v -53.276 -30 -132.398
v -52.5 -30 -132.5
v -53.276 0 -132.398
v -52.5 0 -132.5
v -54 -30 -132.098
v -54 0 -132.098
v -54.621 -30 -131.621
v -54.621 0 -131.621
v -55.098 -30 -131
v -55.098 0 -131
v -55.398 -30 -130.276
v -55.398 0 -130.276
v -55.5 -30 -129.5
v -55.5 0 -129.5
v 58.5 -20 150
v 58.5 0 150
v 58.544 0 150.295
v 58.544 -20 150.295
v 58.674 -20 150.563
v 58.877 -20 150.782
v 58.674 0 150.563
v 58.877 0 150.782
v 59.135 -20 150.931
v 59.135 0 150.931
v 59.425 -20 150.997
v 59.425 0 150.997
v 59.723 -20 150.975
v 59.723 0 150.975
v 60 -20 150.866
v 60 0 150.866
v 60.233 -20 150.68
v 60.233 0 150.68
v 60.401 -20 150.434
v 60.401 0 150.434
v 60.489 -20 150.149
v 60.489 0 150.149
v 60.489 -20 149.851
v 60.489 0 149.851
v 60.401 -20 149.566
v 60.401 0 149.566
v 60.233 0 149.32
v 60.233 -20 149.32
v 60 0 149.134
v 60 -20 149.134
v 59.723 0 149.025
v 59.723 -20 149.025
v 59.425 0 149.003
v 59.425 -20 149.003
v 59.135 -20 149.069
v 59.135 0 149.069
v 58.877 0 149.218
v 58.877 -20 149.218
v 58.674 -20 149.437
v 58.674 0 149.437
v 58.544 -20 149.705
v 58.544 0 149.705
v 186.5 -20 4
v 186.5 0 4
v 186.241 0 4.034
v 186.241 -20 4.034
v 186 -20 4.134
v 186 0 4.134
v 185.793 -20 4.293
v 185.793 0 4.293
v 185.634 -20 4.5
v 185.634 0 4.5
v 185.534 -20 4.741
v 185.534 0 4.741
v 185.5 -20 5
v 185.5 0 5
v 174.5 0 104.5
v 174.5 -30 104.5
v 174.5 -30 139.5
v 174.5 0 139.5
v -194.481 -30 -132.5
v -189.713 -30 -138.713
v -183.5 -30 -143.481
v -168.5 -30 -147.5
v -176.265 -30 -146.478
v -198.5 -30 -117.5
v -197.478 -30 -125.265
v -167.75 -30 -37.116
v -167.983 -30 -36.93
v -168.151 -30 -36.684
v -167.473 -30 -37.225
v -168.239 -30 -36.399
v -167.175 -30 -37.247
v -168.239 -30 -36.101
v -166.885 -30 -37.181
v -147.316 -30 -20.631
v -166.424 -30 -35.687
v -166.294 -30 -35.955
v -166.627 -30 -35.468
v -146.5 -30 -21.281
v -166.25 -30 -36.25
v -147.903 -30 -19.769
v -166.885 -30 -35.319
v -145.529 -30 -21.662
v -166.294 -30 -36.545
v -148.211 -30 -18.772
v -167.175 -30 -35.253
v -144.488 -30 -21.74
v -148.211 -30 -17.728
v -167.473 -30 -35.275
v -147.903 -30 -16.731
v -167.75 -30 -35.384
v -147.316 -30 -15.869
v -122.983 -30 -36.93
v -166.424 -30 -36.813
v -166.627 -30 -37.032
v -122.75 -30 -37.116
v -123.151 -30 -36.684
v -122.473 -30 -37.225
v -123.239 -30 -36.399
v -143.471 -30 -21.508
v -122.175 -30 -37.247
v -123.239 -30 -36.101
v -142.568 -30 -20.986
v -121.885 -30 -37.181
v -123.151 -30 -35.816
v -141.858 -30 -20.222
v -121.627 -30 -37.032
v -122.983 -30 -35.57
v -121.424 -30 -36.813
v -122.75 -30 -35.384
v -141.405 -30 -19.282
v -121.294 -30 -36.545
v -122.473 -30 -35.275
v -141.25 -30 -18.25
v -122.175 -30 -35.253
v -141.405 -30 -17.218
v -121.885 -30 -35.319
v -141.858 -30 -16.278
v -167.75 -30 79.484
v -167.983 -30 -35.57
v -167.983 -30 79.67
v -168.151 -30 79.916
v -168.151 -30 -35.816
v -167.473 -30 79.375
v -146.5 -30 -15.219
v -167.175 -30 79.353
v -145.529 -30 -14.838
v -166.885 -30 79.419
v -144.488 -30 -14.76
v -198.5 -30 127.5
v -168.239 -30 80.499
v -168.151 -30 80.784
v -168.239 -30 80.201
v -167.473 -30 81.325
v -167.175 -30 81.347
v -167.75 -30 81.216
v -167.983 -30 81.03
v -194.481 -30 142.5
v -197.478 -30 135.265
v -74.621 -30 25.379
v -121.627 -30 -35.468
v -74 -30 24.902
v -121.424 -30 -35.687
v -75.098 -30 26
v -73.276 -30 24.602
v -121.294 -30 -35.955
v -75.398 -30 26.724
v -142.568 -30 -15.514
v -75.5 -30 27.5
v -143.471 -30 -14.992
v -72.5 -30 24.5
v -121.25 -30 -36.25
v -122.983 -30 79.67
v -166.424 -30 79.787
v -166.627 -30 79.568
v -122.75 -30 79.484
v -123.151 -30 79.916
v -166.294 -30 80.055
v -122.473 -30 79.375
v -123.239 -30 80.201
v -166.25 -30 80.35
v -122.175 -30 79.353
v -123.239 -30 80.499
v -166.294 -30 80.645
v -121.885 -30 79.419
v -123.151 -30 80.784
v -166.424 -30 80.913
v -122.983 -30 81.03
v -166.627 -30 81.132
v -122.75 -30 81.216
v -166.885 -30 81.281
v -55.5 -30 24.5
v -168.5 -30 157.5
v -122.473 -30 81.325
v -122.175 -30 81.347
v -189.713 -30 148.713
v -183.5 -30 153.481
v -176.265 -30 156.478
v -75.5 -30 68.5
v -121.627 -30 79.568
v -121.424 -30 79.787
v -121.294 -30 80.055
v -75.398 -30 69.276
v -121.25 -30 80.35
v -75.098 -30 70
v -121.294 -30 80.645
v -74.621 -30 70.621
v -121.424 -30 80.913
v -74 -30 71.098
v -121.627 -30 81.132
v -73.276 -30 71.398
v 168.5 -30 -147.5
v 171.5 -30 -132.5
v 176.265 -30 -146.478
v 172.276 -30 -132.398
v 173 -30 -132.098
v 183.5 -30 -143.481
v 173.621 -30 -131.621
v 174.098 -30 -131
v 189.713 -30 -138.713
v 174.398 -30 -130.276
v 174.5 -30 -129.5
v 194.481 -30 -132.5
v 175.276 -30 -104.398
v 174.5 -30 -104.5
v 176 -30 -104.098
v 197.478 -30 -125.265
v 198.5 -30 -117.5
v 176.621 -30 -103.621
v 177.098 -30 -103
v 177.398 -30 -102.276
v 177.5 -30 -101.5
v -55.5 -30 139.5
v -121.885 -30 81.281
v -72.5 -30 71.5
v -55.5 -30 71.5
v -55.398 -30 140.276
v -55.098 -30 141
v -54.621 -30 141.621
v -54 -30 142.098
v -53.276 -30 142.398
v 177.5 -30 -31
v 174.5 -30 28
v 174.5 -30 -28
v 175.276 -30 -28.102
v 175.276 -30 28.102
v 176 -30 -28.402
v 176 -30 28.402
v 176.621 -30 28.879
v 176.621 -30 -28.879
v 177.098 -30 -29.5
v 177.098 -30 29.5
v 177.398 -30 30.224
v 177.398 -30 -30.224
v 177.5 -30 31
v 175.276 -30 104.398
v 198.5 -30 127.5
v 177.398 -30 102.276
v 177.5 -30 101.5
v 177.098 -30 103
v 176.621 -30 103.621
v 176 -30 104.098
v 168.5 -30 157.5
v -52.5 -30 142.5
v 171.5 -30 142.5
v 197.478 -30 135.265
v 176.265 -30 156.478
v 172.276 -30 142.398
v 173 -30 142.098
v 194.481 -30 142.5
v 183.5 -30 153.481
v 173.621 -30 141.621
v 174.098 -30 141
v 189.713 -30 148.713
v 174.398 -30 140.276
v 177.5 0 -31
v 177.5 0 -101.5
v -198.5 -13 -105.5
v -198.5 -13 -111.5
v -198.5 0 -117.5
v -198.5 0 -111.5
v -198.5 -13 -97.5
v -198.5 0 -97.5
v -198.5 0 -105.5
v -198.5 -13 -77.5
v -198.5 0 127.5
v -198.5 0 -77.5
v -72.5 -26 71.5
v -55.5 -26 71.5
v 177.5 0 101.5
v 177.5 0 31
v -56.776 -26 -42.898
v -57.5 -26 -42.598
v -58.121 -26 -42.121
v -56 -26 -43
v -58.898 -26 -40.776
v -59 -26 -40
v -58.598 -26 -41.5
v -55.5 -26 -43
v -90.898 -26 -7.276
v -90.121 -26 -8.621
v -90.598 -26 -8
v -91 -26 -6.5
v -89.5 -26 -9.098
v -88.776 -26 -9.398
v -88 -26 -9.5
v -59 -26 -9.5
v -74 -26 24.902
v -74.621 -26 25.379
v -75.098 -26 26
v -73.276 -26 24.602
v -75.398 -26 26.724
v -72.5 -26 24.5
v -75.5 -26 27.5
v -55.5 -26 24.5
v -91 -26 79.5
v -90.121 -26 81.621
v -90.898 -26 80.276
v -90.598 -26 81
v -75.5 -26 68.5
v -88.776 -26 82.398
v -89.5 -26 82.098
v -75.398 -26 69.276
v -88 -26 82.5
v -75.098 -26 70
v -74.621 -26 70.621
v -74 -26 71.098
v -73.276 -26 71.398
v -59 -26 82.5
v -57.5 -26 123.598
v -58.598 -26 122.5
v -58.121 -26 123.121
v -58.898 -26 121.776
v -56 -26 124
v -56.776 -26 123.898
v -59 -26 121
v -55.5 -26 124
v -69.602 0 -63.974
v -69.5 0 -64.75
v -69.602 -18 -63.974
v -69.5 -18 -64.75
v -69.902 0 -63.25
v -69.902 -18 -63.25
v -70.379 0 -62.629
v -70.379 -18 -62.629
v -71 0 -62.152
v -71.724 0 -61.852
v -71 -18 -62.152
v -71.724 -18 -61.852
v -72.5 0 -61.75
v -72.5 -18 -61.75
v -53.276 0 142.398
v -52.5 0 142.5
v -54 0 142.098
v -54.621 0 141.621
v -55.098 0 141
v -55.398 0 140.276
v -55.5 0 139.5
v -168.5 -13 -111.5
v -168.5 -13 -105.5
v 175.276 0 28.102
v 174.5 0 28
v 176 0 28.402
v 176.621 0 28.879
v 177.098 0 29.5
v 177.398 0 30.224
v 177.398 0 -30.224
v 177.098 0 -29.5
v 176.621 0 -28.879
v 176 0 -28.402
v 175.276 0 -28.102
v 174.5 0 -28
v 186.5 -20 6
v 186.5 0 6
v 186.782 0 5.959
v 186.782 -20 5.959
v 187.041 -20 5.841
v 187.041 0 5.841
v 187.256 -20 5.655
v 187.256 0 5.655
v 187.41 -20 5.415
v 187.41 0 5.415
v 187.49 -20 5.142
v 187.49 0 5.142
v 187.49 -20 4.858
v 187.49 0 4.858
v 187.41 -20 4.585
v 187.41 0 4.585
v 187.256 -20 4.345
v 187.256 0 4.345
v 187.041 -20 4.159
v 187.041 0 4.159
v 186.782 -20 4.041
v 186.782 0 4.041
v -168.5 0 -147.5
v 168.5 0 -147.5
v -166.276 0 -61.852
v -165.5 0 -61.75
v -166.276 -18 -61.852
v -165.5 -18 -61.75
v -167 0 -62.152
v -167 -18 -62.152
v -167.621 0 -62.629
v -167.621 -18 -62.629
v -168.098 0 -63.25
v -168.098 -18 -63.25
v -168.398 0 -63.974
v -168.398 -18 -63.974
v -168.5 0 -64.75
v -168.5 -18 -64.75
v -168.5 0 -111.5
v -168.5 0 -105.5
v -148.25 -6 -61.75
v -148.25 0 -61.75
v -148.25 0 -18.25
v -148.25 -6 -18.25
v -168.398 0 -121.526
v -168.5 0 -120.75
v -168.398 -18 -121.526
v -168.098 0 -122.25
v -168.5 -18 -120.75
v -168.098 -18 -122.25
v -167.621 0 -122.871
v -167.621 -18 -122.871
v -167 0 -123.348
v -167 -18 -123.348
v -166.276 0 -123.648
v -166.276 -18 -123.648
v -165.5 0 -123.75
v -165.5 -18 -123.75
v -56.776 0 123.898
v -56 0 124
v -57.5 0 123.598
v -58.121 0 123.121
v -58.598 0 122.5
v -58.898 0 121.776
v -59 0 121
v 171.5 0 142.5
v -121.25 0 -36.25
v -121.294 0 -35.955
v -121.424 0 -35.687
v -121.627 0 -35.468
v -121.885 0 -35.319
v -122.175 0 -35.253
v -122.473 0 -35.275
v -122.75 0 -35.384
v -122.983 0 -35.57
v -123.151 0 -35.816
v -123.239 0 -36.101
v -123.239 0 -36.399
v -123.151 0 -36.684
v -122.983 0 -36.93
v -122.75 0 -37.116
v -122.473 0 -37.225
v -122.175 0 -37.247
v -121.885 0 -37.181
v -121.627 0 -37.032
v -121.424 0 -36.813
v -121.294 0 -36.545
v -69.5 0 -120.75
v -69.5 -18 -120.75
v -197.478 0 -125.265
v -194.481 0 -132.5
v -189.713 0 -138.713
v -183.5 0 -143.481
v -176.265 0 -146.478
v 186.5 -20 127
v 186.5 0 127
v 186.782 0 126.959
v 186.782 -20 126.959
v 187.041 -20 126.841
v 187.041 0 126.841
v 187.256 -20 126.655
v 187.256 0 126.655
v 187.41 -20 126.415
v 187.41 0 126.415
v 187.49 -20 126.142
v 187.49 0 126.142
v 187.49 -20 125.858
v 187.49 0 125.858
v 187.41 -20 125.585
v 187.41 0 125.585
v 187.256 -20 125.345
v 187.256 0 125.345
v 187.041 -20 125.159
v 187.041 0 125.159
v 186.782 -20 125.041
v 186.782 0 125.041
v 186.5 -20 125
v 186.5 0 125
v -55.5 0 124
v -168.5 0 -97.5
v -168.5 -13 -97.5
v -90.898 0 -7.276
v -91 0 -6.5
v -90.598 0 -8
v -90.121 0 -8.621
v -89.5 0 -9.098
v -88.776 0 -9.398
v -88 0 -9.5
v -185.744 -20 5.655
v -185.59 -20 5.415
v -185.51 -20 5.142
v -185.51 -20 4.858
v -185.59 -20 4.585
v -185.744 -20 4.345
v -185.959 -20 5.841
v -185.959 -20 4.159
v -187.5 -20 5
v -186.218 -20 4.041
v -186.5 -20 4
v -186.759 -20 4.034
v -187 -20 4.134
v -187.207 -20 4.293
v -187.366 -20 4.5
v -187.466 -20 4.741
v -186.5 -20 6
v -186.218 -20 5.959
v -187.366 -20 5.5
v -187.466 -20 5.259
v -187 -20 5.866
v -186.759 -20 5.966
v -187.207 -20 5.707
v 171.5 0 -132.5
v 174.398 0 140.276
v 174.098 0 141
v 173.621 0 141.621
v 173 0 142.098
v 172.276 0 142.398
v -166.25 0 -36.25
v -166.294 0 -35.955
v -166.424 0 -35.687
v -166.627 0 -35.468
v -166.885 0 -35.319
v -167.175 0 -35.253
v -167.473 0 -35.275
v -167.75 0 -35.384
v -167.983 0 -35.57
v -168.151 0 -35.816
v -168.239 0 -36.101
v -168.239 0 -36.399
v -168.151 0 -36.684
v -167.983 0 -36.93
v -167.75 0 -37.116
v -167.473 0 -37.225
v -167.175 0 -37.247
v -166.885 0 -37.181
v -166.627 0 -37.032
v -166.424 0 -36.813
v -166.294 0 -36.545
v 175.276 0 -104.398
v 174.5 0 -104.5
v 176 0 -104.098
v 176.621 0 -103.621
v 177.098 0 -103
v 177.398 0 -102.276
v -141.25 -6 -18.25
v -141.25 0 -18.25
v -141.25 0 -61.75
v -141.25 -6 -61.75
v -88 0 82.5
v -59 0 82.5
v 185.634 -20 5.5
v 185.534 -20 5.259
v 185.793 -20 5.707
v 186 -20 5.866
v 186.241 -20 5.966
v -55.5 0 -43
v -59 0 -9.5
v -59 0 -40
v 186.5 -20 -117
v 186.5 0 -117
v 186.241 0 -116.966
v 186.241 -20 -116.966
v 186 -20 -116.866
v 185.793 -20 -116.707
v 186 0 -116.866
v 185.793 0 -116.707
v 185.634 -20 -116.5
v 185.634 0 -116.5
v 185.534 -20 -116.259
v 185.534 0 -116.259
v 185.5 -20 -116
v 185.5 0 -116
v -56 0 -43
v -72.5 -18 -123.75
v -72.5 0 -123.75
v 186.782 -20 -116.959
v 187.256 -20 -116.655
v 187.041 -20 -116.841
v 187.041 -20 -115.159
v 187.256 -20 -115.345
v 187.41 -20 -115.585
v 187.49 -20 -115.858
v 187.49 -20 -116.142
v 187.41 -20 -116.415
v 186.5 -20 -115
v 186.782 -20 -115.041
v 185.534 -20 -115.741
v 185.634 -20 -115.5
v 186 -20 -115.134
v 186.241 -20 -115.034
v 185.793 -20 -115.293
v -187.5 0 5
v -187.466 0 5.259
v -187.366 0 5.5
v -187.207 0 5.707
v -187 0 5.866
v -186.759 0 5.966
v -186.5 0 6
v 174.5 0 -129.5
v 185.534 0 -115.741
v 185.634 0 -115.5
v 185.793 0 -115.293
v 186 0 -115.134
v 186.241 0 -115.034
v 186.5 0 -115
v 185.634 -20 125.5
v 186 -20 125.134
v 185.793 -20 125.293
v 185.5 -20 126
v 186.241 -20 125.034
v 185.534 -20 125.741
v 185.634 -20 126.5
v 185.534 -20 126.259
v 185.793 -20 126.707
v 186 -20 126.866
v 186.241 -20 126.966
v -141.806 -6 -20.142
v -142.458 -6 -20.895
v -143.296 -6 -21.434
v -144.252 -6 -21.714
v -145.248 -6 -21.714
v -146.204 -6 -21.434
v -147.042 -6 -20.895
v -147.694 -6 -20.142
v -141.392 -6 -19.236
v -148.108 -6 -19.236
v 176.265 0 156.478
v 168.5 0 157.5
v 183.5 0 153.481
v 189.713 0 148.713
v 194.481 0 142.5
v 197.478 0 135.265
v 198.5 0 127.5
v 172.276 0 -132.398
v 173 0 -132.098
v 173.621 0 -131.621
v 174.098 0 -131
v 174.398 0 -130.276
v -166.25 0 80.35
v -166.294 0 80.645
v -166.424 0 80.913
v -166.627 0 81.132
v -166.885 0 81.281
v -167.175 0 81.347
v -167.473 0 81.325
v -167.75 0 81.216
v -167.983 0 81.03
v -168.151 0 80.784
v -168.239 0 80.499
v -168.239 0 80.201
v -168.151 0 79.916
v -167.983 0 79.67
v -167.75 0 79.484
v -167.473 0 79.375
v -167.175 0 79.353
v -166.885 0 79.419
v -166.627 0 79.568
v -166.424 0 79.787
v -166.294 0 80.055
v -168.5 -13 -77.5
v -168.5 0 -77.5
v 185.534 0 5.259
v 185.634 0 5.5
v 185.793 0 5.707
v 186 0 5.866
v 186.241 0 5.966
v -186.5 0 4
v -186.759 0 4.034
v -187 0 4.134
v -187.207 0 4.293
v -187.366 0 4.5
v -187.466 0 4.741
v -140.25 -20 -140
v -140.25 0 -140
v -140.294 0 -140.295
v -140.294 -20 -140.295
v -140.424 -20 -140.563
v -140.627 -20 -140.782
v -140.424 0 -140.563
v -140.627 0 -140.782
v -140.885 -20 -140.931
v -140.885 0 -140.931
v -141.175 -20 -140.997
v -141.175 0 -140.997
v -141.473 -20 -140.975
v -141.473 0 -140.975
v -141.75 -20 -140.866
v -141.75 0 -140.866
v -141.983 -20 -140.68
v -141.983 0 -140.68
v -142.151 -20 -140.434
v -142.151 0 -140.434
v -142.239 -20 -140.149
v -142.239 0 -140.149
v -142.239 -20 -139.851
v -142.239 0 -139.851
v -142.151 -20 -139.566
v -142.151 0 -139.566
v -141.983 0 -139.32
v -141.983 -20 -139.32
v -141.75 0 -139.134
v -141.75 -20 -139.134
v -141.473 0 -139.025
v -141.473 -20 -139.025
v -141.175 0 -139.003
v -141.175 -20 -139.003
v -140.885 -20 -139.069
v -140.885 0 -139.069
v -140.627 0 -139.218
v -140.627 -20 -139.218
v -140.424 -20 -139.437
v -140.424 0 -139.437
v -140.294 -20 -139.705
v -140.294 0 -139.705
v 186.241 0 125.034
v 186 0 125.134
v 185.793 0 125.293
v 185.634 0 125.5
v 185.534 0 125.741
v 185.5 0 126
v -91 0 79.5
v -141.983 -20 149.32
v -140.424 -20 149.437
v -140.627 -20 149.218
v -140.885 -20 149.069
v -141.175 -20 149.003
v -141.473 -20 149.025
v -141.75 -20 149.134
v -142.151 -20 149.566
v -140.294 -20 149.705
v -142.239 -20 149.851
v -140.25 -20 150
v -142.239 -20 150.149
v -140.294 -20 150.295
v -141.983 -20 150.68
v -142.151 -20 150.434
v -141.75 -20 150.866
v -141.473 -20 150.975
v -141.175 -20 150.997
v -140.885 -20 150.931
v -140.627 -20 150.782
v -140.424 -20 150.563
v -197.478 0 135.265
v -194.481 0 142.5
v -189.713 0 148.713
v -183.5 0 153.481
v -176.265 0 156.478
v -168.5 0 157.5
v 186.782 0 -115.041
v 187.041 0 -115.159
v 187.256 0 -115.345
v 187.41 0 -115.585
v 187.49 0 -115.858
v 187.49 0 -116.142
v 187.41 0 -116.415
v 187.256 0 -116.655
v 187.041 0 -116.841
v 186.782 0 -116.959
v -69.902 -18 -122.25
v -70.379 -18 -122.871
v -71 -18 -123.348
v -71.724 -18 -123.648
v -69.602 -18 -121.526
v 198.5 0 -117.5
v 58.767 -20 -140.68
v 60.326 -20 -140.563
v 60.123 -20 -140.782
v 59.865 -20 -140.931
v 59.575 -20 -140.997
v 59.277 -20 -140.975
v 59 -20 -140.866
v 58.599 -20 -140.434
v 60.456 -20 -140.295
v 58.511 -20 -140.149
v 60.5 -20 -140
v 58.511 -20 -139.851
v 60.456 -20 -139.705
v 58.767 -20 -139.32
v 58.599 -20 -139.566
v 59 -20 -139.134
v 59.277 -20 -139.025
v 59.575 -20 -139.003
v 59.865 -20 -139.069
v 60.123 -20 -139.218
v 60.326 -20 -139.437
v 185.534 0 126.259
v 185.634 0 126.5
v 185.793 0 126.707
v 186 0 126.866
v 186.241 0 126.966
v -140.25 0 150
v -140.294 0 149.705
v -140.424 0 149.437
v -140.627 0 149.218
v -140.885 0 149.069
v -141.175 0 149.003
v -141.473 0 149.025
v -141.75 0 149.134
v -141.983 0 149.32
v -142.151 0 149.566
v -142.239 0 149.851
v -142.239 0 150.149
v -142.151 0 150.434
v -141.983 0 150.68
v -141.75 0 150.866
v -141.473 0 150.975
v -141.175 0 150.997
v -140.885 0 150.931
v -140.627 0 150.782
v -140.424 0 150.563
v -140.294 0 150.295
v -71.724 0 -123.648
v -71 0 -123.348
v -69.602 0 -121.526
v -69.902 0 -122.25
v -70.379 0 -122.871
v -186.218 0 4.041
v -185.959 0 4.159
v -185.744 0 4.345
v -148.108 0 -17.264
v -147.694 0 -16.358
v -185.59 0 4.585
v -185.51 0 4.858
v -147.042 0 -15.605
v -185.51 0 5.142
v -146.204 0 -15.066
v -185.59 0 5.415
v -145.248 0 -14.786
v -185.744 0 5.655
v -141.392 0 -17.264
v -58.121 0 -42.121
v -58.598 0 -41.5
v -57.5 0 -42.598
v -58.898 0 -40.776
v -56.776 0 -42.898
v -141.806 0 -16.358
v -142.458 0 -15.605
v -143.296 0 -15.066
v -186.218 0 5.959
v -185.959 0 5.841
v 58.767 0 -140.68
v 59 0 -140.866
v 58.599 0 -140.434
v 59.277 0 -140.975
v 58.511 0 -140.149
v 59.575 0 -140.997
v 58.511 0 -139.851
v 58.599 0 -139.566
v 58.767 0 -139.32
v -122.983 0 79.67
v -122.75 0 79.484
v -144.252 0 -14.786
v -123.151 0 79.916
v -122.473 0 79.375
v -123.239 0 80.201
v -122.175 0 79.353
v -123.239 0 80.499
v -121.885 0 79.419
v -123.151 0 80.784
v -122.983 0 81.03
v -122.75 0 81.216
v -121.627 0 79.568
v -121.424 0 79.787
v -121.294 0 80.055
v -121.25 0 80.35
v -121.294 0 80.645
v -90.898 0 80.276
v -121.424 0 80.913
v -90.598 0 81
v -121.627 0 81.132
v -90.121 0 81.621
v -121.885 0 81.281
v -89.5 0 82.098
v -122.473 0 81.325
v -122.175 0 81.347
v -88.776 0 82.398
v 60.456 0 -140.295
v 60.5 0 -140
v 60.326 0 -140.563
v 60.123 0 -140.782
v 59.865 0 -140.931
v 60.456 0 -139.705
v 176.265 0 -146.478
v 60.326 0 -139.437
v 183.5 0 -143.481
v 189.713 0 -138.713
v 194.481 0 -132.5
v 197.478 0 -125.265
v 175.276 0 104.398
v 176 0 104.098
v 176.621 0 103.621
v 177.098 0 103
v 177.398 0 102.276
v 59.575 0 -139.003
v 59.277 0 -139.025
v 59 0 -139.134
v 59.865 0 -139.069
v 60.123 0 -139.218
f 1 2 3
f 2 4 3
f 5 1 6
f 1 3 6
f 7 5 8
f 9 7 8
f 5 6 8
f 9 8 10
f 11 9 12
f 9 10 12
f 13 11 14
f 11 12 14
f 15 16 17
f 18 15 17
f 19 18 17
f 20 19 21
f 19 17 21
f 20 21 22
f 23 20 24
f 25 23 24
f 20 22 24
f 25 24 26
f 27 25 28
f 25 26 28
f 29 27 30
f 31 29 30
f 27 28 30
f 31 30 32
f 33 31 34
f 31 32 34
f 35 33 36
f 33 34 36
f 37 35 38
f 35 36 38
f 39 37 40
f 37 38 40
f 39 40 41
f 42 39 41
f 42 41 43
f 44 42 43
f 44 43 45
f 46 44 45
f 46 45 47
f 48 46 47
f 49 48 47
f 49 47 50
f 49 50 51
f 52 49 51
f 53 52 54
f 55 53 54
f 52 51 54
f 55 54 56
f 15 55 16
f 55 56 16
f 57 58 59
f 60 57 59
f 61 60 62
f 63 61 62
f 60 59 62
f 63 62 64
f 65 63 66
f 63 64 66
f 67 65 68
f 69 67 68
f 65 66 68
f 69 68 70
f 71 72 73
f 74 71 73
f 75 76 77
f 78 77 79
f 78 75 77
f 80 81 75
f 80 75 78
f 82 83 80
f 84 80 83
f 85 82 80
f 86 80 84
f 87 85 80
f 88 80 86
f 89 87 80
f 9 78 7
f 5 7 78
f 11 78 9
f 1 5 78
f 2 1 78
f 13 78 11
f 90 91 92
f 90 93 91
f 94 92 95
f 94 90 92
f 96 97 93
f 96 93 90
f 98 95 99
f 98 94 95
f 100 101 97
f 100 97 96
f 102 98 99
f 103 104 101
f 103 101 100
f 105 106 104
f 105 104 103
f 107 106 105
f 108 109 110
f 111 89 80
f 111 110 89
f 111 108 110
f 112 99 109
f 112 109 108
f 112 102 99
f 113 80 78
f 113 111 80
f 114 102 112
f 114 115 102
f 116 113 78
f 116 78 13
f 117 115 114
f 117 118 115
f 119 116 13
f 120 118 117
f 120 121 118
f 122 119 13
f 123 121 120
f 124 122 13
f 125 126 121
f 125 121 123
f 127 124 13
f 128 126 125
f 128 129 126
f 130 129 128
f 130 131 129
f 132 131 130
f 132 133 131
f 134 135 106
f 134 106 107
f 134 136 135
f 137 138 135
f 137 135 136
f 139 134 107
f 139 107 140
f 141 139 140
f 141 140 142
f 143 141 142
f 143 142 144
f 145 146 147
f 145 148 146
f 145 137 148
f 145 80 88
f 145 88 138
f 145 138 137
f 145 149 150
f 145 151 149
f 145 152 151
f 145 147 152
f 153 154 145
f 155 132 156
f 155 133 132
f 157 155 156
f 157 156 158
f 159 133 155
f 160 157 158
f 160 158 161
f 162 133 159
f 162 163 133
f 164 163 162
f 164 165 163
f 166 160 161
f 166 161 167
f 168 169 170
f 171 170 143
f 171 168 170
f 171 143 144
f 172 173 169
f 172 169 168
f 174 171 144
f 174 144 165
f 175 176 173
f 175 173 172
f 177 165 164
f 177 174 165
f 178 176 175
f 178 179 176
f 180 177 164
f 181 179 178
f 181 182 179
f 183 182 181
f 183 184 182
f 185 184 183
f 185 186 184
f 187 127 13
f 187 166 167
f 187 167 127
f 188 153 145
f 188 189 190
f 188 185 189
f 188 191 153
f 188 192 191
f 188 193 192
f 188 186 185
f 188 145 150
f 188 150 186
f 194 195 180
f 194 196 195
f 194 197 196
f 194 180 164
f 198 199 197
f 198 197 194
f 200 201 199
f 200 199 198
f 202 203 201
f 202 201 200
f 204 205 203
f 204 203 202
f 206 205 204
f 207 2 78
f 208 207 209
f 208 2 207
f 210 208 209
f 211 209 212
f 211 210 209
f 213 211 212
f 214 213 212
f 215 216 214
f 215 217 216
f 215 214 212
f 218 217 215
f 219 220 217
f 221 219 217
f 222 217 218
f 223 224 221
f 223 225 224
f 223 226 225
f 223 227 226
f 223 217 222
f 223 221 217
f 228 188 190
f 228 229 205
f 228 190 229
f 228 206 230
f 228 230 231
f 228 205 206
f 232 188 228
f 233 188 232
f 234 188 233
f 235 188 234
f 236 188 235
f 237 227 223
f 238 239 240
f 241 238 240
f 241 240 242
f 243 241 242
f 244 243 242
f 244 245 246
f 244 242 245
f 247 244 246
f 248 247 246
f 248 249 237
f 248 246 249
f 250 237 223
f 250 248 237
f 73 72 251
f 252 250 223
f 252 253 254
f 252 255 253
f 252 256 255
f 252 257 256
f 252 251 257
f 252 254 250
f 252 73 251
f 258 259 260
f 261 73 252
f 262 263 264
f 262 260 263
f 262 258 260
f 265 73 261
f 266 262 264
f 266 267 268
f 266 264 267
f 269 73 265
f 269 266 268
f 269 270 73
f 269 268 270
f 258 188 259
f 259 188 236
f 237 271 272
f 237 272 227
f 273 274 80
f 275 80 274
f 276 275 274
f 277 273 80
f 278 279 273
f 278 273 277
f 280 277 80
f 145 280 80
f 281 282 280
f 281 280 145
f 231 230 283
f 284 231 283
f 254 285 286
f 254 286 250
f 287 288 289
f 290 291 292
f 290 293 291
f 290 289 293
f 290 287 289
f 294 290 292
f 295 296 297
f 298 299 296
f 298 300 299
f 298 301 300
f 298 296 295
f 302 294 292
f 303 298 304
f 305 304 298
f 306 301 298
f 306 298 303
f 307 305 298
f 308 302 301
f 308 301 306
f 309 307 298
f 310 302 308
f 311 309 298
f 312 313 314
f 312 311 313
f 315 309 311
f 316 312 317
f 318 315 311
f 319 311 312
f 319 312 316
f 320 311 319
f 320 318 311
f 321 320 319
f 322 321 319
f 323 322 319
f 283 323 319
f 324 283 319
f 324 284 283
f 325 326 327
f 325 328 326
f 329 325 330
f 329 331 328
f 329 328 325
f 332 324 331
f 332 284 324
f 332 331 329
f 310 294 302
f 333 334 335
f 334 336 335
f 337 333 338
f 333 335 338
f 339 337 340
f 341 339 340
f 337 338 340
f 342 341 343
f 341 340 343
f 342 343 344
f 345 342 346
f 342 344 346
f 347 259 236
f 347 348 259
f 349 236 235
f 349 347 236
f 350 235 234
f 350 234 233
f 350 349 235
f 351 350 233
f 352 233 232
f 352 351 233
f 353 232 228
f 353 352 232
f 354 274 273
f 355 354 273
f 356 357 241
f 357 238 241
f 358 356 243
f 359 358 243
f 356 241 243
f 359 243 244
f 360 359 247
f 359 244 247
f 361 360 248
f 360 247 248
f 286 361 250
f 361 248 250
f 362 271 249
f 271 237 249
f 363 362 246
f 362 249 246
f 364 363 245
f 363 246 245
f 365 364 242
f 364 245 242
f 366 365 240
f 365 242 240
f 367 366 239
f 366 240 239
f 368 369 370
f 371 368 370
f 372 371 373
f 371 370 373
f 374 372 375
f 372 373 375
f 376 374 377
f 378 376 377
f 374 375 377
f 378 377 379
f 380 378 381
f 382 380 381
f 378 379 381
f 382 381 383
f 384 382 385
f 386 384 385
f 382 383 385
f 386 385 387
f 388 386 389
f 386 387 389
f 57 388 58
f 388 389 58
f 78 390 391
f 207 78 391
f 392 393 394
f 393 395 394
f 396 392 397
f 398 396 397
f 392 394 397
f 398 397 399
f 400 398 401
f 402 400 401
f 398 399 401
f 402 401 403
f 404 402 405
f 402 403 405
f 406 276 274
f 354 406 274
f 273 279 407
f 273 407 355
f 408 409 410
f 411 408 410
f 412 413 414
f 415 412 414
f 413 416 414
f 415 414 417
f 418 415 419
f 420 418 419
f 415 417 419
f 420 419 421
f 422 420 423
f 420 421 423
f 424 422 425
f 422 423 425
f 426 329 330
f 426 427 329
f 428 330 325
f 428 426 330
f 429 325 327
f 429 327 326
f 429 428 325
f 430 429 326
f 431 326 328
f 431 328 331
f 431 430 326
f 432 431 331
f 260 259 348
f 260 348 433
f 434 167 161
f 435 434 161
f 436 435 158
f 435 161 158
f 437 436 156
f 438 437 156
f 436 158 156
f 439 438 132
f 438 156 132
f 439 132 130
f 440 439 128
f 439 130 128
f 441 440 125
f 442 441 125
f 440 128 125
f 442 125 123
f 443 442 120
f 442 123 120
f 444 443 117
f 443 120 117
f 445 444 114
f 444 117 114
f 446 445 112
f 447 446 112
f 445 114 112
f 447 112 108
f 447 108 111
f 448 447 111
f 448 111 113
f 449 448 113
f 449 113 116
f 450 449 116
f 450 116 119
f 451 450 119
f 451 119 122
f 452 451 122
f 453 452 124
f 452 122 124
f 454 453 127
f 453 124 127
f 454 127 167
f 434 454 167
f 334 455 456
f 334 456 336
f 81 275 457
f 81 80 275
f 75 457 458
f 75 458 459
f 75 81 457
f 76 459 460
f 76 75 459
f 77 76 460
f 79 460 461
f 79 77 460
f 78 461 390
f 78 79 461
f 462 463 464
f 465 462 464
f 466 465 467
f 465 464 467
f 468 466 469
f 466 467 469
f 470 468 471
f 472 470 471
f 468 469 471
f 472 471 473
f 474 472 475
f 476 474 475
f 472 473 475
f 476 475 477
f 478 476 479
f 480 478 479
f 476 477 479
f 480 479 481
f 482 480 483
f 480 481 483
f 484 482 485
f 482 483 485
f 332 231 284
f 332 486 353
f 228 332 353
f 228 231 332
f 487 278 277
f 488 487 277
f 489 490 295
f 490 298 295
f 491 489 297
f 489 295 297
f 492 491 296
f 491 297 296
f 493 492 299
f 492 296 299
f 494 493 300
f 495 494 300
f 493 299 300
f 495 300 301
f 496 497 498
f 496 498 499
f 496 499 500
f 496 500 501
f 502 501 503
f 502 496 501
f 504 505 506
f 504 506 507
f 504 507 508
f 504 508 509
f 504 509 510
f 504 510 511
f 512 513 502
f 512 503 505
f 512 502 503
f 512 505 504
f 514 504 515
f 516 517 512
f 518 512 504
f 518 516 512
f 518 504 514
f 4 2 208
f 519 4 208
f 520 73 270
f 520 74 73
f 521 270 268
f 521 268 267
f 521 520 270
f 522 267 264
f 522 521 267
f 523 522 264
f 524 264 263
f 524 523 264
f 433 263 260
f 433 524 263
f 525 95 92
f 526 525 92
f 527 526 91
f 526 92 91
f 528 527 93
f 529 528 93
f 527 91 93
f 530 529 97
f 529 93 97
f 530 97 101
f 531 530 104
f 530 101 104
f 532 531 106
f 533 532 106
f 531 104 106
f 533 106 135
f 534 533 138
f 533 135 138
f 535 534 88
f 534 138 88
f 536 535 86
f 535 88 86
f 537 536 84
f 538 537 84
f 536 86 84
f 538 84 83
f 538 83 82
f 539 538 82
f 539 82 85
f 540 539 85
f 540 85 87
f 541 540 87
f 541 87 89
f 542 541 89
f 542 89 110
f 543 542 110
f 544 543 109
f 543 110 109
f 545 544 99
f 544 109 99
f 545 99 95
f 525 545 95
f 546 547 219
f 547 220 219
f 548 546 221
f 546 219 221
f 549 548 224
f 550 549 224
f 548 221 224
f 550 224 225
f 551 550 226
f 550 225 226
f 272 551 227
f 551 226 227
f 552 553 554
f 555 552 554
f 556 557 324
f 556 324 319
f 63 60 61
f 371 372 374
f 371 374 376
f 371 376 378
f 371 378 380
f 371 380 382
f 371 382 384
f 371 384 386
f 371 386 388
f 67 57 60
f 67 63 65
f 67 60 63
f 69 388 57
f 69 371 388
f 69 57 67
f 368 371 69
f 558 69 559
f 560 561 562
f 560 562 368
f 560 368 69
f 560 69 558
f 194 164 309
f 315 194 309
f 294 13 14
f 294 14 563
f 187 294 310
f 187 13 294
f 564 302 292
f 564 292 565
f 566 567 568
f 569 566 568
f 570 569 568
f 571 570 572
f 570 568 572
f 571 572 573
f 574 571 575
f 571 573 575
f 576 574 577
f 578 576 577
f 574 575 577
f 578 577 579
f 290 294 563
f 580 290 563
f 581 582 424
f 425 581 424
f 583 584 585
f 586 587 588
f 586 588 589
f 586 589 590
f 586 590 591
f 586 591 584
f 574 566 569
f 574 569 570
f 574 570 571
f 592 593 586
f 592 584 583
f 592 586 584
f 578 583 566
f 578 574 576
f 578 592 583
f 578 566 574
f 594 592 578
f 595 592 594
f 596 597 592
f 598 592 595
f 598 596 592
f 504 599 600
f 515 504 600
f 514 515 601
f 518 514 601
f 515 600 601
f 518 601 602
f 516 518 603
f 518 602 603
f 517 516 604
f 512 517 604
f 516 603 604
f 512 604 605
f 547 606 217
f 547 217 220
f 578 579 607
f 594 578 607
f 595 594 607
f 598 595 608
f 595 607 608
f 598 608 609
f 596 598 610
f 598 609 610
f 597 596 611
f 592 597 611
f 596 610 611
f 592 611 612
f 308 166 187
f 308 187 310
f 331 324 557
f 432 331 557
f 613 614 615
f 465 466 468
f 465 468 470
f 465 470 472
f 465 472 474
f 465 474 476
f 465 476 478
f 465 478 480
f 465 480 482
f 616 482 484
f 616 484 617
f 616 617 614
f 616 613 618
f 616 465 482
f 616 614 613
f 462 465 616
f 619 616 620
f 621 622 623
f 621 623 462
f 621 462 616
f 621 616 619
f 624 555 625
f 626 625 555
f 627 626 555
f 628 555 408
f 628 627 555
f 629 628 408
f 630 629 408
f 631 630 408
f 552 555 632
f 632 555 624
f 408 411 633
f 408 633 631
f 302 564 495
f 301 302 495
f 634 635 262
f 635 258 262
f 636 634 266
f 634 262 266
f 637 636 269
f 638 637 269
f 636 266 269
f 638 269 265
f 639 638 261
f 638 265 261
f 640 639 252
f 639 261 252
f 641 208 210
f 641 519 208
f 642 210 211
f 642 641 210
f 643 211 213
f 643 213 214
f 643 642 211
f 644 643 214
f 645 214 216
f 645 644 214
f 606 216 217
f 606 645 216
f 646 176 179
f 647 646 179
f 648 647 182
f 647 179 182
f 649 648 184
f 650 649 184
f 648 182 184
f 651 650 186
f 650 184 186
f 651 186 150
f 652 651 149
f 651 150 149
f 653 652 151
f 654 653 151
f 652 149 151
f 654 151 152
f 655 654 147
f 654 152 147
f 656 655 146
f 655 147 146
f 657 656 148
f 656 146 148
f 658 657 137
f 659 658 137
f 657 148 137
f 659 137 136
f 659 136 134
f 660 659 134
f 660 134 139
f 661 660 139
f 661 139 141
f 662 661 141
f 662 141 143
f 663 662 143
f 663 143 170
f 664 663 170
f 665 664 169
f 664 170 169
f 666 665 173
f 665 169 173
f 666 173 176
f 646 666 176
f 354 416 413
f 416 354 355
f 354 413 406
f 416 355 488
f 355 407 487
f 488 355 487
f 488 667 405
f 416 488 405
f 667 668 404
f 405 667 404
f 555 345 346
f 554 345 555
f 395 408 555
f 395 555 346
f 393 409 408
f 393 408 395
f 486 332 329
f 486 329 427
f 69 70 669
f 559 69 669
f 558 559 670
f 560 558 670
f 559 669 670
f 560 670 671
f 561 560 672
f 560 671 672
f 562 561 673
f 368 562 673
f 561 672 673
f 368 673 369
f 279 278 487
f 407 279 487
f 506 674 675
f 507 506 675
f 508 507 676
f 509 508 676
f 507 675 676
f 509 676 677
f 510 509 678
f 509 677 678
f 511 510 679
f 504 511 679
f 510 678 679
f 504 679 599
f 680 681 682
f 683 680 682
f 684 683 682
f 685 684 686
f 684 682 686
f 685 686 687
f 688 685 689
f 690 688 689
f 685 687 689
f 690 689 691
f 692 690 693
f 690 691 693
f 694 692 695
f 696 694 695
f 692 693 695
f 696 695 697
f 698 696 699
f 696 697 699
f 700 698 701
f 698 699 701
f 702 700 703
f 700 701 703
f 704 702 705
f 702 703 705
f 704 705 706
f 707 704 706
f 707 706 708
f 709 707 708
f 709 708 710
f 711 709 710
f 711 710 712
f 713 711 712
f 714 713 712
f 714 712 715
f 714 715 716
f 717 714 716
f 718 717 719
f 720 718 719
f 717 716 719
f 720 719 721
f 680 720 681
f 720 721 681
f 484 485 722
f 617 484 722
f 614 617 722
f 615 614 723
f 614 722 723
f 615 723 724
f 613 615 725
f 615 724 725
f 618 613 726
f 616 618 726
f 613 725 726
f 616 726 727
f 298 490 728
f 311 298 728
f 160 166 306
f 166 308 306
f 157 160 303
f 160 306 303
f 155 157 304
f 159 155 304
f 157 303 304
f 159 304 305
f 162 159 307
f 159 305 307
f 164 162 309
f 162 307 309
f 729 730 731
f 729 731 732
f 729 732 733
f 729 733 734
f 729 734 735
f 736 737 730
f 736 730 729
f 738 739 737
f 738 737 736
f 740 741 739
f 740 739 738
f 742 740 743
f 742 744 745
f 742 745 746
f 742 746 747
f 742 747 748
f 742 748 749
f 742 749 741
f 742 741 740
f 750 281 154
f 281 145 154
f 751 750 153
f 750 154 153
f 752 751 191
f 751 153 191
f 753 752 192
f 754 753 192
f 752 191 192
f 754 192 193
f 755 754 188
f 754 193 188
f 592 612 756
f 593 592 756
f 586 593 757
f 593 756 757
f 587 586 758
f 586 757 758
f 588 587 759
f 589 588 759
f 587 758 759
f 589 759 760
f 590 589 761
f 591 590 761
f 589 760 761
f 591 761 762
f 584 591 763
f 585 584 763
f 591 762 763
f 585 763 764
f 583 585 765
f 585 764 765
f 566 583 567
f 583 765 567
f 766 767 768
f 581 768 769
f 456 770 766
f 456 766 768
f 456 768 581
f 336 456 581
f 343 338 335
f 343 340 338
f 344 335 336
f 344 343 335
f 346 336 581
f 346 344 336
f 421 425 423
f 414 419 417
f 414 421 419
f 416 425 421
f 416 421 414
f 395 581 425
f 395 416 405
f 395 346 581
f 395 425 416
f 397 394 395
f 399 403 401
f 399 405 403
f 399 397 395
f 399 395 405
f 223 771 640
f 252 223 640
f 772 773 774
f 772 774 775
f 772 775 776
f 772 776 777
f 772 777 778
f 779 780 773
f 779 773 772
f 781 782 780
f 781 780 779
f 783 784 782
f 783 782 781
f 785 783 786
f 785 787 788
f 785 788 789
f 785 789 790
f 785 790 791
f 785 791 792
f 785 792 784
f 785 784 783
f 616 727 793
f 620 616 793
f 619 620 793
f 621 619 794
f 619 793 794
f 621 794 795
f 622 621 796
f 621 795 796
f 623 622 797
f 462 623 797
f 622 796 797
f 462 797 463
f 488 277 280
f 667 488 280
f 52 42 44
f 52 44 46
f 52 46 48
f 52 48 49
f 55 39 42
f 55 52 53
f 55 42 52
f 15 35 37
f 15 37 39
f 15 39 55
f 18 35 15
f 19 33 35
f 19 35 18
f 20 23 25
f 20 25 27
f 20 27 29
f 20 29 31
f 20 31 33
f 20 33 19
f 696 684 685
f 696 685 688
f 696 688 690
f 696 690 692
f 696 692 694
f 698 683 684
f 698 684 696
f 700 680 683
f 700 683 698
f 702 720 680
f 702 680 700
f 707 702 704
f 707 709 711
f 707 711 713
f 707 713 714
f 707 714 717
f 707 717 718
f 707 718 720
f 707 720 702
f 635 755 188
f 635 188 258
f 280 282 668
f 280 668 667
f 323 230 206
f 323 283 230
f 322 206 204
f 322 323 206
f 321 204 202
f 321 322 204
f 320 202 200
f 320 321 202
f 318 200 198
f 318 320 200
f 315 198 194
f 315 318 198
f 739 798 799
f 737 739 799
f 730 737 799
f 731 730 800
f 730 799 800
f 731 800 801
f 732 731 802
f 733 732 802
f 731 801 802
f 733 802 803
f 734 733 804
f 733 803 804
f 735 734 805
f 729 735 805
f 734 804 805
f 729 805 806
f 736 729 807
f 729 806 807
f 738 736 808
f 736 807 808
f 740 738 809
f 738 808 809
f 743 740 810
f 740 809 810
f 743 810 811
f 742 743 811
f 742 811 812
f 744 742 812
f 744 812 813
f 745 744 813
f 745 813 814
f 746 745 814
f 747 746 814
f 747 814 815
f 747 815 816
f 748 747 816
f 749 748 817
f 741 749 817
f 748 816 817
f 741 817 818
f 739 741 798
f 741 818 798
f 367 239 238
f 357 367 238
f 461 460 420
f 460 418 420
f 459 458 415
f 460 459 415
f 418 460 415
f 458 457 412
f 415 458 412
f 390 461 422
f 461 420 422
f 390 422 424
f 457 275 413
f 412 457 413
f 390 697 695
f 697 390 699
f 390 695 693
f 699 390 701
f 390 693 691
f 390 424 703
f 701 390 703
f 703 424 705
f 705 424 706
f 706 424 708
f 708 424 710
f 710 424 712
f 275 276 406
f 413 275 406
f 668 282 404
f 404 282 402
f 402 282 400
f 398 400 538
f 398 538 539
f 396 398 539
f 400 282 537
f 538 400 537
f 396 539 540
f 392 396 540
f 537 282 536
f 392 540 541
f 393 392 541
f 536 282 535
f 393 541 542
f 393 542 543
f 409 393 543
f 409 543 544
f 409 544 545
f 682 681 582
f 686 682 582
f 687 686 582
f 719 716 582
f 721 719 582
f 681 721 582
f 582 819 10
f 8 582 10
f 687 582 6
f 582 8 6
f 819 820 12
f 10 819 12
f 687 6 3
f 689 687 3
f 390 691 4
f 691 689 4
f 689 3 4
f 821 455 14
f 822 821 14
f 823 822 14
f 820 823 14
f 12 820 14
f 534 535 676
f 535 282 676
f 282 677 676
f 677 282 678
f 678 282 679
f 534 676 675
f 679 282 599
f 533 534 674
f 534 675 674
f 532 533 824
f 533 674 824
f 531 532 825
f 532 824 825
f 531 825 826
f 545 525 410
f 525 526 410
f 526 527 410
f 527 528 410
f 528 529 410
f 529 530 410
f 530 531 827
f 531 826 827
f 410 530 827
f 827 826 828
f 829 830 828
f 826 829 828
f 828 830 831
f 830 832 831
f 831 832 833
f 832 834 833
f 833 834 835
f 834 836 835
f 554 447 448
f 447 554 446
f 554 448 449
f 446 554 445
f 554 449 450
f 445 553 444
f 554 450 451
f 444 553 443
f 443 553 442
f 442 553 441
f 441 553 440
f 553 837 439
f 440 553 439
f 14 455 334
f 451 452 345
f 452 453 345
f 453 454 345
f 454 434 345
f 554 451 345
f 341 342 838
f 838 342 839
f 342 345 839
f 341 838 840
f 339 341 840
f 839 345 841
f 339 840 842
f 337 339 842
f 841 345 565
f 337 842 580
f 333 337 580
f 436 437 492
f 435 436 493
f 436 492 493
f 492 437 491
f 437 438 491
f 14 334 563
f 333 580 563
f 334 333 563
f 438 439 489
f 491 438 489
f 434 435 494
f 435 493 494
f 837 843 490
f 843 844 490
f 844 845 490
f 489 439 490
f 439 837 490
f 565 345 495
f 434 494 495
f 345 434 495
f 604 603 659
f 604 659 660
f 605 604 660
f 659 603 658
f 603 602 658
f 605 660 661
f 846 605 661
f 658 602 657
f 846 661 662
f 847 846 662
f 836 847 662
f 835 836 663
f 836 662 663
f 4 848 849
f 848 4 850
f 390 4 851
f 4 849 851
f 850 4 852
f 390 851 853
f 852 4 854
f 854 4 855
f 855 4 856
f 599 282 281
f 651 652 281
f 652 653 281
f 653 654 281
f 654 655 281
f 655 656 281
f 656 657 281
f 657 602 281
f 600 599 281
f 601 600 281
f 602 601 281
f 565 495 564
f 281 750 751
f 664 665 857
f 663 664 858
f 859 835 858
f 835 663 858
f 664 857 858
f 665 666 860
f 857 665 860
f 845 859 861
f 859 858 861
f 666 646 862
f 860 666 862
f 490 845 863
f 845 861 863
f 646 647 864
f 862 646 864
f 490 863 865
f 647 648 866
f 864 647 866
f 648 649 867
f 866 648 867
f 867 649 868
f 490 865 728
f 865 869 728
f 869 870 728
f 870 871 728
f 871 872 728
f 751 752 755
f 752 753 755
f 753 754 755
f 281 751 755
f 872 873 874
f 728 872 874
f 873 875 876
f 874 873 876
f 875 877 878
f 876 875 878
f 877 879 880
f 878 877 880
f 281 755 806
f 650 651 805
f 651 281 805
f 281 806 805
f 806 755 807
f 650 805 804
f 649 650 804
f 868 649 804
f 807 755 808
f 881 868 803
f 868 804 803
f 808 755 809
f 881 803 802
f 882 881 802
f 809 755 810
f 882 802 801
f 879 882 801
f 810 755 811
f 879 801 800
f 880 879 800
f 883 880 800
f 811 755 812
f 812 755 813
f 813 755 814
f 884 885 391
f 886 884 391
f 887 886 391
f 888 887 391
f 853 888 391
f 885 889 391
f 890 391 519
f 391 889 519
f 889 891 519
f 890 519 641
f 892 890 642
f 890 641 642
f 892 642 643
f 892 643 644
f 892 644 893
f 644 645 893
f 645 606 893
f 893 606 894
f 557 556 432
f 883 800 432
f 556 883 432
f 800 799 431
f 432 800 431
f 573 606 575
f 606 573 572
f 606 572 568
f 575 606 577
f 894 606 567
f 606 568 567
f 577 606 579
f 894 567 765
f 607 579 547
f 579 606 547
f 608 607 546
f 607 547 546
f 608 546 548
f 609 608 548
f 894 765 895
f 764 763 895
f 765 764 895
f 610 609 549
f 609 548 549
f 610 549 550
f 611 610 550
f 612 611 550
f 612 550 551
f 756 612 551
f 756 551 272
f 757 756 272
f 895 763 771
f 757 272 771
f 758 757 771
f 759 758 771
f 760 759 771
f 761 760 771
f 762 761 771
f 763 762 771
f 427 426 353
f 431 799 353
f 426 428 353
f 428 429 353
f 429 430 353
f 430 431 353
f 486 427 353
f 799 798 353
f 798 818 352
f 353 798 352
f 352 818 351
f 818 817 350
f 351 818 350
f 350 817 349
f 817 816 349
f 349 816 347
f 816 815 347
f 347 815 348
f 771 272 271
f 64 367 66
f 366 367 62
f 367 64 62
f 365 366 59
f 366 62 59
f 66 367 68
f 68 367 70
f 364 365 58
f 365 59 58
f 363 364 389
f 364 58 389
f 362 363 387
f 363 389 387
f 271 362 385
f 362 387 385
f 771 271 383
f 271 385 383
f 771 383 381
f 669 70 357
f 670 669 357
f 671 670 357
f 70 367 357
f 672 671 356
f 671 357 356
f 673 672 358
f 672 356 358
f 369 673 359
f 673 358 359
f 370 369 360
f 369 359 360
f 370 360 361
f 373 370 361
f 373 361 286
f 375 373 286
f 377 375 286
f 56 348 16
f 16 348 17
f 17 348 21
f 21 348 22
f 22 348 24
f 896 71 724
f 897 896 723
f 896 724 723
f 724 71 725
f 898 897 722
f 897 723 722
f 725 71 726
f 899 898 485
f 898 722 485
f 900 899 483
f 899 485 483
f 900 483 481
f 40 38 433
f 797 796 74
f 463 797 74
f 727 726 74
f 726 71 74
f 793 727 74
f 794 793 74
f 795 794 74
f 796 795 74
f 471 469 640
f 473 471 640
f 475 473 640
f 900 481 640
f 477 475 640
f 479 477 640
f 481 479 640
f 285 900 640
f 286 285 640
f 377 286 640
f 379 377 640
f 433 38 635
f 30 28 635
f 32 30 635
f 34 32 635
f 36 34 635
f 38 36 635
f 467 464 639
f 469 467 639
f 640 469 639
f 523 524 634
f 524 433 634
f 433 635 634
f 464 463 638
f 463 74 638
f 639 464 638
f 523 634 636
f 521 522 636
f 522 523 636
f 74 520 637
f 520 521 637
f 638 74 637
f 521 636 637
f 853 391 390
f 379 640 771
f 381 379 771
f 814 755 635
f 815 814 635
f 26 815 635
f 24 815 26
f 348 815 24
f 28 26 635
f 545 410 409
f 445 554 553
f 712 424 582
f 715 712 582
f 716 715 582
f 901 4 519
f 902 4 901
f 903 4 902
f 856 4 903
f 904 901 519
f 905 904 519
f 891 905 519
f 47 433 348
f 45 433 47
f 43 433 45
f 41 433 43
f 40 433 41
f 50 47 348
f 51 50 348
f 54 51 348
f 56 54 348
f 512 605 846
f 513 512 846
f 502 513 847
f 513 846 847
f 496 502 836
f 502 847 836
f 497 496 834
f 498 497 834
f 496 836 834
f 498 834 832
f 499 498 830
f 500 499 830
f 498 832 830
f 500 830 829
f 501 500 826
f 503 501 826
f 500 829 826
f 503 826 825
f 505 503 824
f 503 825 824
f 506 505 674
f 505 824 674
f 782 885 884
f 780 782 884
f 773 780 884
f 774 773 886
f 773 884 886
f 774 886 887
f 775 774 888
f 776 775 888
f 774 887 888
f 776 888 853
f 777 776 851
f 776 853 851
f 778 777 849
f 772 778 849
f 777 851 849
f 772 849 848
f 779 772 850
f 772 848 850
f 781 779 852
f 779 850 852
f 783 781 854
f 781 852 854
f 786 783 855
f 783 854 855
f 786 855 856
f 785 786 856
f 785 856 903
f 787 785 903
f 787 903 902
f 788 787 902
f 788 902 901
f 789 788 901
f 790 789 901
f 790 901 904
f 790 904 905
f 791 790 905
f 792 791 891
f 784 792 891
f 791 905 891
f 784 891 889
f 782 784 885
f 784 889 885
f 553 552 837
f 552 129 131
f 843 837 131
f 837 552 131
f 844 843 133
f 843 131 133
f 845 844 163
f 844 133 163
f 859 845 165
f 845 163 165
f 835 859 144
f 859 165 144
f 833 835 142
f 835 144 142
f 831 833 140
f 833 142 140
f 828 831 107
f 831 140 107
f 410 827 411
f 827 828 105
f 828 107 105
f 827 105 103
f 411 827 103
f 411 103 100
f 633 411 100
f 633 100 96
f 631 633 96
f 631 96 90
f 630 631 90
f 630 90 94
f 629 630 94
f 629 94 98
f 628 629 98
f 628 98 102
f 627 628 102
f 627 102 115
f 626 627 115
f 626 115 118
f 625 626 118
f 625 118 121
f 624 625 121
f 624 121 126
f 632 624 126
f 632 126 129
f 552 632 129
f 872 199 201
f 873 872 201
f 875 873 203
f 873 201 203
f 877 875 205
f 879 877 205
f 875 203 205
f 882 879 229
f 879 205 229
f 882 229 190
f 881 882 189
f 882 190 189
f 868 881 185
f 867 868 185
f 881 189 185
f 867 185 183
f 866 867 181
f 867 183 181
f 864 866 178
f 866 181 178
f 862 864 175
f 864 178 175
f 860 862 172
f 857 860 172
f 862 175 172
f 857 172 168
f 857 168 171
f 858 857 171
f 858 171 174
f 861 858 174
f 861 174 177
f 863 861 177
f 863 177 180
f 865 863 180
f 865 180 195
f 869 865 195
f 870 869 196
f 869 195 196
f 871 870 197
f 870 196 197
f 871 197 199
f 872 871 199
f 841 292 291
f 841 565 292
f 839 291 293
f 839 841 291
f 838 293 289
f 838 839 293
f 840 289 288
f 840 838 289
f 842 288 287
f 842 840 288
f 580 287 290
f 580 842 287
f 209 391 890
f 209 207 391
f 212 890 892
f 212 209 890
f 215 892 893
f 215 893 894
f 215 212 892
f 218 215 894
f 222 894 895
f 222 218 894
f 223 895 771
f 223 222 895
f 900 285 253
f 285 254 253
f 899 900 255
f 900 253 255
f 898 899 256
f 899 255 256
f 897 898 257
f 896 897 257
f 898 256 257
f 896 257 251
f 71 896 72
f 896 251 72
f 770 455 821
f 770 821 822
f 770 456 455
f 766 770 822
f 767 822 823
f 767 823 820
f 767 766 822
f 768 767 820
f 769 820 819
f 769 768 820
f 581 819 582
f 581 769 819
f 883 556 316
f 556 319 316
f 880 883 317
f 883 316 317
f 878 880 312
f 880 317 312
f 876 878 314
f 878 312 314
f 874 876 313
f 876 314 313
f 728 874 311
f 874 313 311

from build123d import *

# Parameters (mm, degrees)
F0_W      = 397
F0_H      = 305
F1_DEPTH  = 30
F2_W      = 230
F2_H      = 275
F3_DEPTH  = 30
F4_R      = 3
F5_R      = 30
F6_W      = 26
F6_H      = 167
F7_DEPTH  = 3.5
F8_R      = 3
F10_W     = 32
F10_H     = 92
F11_DEPTH = 26
F12_R     = 3
F13_W     = 4
F13_H     = 47
F14_DEPTH = 20
F15_R     = 3
F16_W     = 30
F16_H     = 76.5
F17_DEPTH = 3
F18_R     = 2.99999
F19_R     = 3.5
F20_DEPTH = 30
F21_W     = 99
F21_H     = 62
F22_DEPTH = 18
F23_R     = 3
F25_DEPTH = 6
F26_W     = 13
F26_H     = 20
F26_H_2   = 6
F27_DEPTH = 30
F28_R     = 1
F29_DEPTH = 30
F31_DEPTH = 20


# Not quite as in the source:
# - a fillet or chamfer is up to 0.001 mm smaller than in the source, because OpenCascade refuses the exact size
# - a feature names something its author has since deleted; it is built from what else it names


with BuildPart() as f1:
    # F0 (on Front) → F1 (new body)
    with BuildSketch(Plane.XZ):
        with Locations((0, 5)):
            Rectangle(F0_W, F0_H)
    extrude(amount=F1_DEPTH)

    # F2 (on face) → F3 (cut, through all)
    with BuildSketch(Plane.XZ.offset(30)):
        with Locations((59.5, 5)):
            Rectangle(F2_W, F2_H)
    extrude(amount=-F3_DEPTH, mode=Mode.SUBTRACT)

    # F4
    f4_edges = [f1.edges().sort_by_distance(p)[0] for p in [
        (-55.5, -15, 142.5),
        (174.5, -15, 142.5),
        (174.5, -15, -132.5),
        (-55.5, -15, -132.5),
    ]]
    fillet(f4_edges, radius=F4_R)

    # F5
    f5_edges = [f1.edges().sort_by_distance(p)[0] for p in [
        (-198.5, -15, -147.5),
        (-198.5, -15, 157.5),
        (198.5, -15, 157.5),
        (198.5, -15, -147.5),
    ]]
    fillet(f5_edges, radius=F5_R)

    # F6 (on face) → F7 (cut)
    with BuildSketch(Plane.YZ.offset(-55.5)):
        with Locations((-13, 40.5)):
            Rectangle(F6_W, F6_H)
    extrude(amount=-F7_DEPTH, mode=Mode.SUBTRACT)

    # F8
    f8_edges = [f1.edges().sort_by_distance(p)[0] for p in [
        (-59, -13, -43),
        (-59, -13, 124),
    ]]
    fillet(f8_edges, radius=F8_R)

    # F10 (on face) → F11 (cut)
    with BuildSketch(Plane(origin=(0, 0, 0), x_dir=(-1, 0, 0), z_dir=(0, 1, 0))):
        with Locations((75, 36.5)):
            Rectangle(F10_W, F10_H)
    extrude(amount=-F11_DEPTH, mode=Mode.SUBTRACT)

    # F12
    f12_edges = [f1.edges().sort_by_distance(p)[0] for p in [
        (-91, -13, -9.5),
        (-91, -13, 82.5),
    ]]
    fillet(f12_edges, radius=F12_R)

    # F13 (on face) → F14 (cut)
    with BuildSketch(Plane.YZ.offset(-55.5)):
        with Locations((-28, 48)):
            Rectangle(F13_W, F13_H)
    extrude(amount=-F14_DEPTH, mode=Mode.SUBTRACT)

    # F15
    f15_edges = [f1.edges().sort_by_distance(p)[0] for p in [
        (-75.5, -28, 24.5),
        (-75.5, -28, 71.5),
    ]]
    fillet(f15_edges, radius=F15_R)

    # F16 (on face) → F17 (cut)
    with BuildSketch(Plane(origin=(174.5, 0, 0), x_dir=(0, -1, 0), z_dir=(-1, 0, 0))):
        with Locations((15, -66.25)):
            Rectangle(F16_W, F16_H)
        with Locations((15, 66.25)):
            Rectangle(F16_W, F16_H)
    extrude(amount=-F17_DEPTH, mode=Mode.SUBTRACT)

    # F18 (radius 3 in the source; OpenCascade refuses exactly that, so slightly less here)
    f18_edges = [f1.edges().sort_by_distance(p)[0] for p in [
        (177.5, -15, -104.5),
        (177.5, -15, 28),
        (177.5, -15, 104.5),
        (177.5, -15, -28),
    ]]
    fillet(f18_edges, radius=F18_R)

    # F19 (on face) → F20 (cut)
    with BuildSketch(Plane.XZ.offset(30)):
        with Locations((-144.75, -18.25)):
            Circle(F19_R)
    extrude(amount=-F20_DEPTH, mode=Mode.SUBTRACT)

    # F21 (on face) → F22 (cut)
    with BuildSketch(Plane(origin=(0, 0, 0), x_dir=(-1, 0, 0), z_dir=(0, 1, 0))):
        with Locations((119, -92.75)):
            Rectangle(F21_W, F21_H)
    extrude(amount=-F22_DEPTH, mode=Mode.SUBTRACT)

    # F23
    f23_edges = [f1.edges().sort_by_distance(p)[0] for p in [
        (-168.5, -9, -123.75),
        (-69.5, -9, -123.75),
        (-69.5, -9, -61.75),
        (-168.5, -9, -61.75),
    ]]
    fillet(f23_edges, radius=F23_R)

    # F24 (on face) → F25 (cut)
    with BuildSketch(Plane(origin=(0, 0, 0), x_dir=(-1, 0, 0), z_dir=(0, 1, 0))):
        with BuildLine():
            ThreePointArc((148.25, -18.25), (144.75, -21.75), (141.25, -18.25))
            Line((141.25, -18.25), (141.25, -61.75))
            Line((141.25, -61.75), (148.25, -61.75))
            Line((148.25, -61.75), (148.25, -18.25))
        make_face()
    extrude(amount=-F25_DEPTH, mode=Mode.SUBTRACT)

    # F26 (on face) → F27 (cut)
    with BuildSketch(Plane(origin=(-198.5, 0, 0), x_dir=(0, -1, 0), z_dir=(-1, 0, 0))):
        with Locations((6.5, -87.5)):
            Rectangle(F26_W, F26_H)
        with Locations((6.5, -108.5)):
            Rectangle(F26_W, F26_H_2)
    extrude(amount=-F27_DEPTH, mode=Mode.SUBTRACT)

    # F28 (on face) → F29 (cut)
    with BuildSketch(Plane.XZ.offset(30)):
        with Locations((-167.25, 80.35)):
            Circle(F28_R)
        with Locations((-167.25, -36.25)):
            Circle(F28_R)
        with Locations((-122.25, -36.25)):
            Circle(F28_R)
        with Locations((-122.25, 80.35)):
            Circle(F28_R)
    extrude(amount=-F29_DEPTH, mode=Mode.SUBTRACT)

    # F30 (on face) → F31 (cut)
    with BuildSketch(Plane(origin=(0, 0, 0), x_dir=(-1, 0, 0), z_dir=(0, 1, 0))):
        with BuildLine():
            Line((-186.5, 125), (-186.5, 127))
            ThreePointArc((-186.5, 127), (-187.5, 126), (-186.5, 125))
        make_face()
        with BuildLine():
            ThreePointArc((-185.5, 126), (-185.7928932188, 126.7071067812), (-186.5, 127))
            Line((-186.5, 127), (-186.5, 125))
            ThreePointArc((-186.5, 125), (-185.7928932188, 125.2928932188), (-185.5, 126))
        make_face()
        with BuildLine():
            ThreePointArc((-60.5, 150), (-59.5, 149), (-58.5, 150))
            Line((-58.5, 150), (-60.5, 150))
        make_face()
        with BuildLine():
            Line((-60.5, 150), (-58.5, 150))
            ThreePointArc((-58.5, 150), (-59.5, 151), (-60.5, 150))
        make_face()
        with BuildLine():
            Line((140.25, 150), (142.25, 150))
            ThreePointArc((142.25, 150), (141.25, 151), (140.25, 150))
        make_face()
        with BuildLine():
            ThreePointArc((140.25, 150), (141.25, 149), (142.25, 150))
            Line((142.25, 150), (140.25, 150))
        make_face()
        with BuildLine():
            ThreePointArc((187.5, 5), (187.2071067812, 5.7071067812), (186.5, 6))
            Line((186.5, 6), (186.5, 4))
            ThreePointArc((186.5, 4), (187.2071067812, 4.2928932188), (187.5, 5))
        make_face()
        with BuildLine():
            Line((186.5, 4), (186.5, 6))
            ThreePointArc((186.5, 6), (185.5, 5), (186.5, 4))
        make_face()
        with BuildLine():
            Line((140.25, -140), (142.25, -140))
            ThreePointArc((142.25, -140), (141.25, -139), (140.25, -140))
        make_face()
        with BuildLine():
            ThreePointArc((140.25, -140), (141.25, -141), (142.25, -140))
            Line((142.25, -140), (140.25, -140))
        make_face()
        with BuildLine():
            Line((-60.5, -140), (-58.5, -140))
            ThreePointArc((-58.5, -140), (-59.5, -139), (-60.5, -140))
        make_face()
        with BuildLine():
            ThreePointArc((-60.5, -140), (-59.5, -141), (-58.5, -140))
            Line((-58.5, -140), (-60.5, -140))
        make_face()
        with BuildLine():
            ThreePointArc((-185.5, -116), (-185.7928932188, -115.2928932188), (-186.5, -115))
            Line((-186.5, -115), (-186.5, -117))
            ThreePointArc((-186.5, -117), (-185.7928932188, -116.7071067812), (-185.5, -116))
        make_face()
        with BuildLine():
            Line((-186.5, -117), (-186.5, -115))
            ThreePointArc((-186.5, -115), (-187.5, -116), (-186.5, -117))
        make_face()
        with BuildLine():
            Line((-186.5, 4), (-186.5, 6))
            ThreePointArc((-186.5, 6), (-187.5, 5), (-186.5, 4))
        make_face()
        with BuildLine():
            ThreePointArc((-185.5, 5), (-185.7928932188, 5.7071067812), (-186.5, 6))
            Line((-186.5, 6), (-186.5, 4))
            ThreePointArc((-186.5, 4), (-185.7928932188, 4.2928932188), (-185.5, 5))
        make_face()
    extrude(amount=-F31_DEPTH, mode=Mode.SUBTRACT)


solid = f1.part
